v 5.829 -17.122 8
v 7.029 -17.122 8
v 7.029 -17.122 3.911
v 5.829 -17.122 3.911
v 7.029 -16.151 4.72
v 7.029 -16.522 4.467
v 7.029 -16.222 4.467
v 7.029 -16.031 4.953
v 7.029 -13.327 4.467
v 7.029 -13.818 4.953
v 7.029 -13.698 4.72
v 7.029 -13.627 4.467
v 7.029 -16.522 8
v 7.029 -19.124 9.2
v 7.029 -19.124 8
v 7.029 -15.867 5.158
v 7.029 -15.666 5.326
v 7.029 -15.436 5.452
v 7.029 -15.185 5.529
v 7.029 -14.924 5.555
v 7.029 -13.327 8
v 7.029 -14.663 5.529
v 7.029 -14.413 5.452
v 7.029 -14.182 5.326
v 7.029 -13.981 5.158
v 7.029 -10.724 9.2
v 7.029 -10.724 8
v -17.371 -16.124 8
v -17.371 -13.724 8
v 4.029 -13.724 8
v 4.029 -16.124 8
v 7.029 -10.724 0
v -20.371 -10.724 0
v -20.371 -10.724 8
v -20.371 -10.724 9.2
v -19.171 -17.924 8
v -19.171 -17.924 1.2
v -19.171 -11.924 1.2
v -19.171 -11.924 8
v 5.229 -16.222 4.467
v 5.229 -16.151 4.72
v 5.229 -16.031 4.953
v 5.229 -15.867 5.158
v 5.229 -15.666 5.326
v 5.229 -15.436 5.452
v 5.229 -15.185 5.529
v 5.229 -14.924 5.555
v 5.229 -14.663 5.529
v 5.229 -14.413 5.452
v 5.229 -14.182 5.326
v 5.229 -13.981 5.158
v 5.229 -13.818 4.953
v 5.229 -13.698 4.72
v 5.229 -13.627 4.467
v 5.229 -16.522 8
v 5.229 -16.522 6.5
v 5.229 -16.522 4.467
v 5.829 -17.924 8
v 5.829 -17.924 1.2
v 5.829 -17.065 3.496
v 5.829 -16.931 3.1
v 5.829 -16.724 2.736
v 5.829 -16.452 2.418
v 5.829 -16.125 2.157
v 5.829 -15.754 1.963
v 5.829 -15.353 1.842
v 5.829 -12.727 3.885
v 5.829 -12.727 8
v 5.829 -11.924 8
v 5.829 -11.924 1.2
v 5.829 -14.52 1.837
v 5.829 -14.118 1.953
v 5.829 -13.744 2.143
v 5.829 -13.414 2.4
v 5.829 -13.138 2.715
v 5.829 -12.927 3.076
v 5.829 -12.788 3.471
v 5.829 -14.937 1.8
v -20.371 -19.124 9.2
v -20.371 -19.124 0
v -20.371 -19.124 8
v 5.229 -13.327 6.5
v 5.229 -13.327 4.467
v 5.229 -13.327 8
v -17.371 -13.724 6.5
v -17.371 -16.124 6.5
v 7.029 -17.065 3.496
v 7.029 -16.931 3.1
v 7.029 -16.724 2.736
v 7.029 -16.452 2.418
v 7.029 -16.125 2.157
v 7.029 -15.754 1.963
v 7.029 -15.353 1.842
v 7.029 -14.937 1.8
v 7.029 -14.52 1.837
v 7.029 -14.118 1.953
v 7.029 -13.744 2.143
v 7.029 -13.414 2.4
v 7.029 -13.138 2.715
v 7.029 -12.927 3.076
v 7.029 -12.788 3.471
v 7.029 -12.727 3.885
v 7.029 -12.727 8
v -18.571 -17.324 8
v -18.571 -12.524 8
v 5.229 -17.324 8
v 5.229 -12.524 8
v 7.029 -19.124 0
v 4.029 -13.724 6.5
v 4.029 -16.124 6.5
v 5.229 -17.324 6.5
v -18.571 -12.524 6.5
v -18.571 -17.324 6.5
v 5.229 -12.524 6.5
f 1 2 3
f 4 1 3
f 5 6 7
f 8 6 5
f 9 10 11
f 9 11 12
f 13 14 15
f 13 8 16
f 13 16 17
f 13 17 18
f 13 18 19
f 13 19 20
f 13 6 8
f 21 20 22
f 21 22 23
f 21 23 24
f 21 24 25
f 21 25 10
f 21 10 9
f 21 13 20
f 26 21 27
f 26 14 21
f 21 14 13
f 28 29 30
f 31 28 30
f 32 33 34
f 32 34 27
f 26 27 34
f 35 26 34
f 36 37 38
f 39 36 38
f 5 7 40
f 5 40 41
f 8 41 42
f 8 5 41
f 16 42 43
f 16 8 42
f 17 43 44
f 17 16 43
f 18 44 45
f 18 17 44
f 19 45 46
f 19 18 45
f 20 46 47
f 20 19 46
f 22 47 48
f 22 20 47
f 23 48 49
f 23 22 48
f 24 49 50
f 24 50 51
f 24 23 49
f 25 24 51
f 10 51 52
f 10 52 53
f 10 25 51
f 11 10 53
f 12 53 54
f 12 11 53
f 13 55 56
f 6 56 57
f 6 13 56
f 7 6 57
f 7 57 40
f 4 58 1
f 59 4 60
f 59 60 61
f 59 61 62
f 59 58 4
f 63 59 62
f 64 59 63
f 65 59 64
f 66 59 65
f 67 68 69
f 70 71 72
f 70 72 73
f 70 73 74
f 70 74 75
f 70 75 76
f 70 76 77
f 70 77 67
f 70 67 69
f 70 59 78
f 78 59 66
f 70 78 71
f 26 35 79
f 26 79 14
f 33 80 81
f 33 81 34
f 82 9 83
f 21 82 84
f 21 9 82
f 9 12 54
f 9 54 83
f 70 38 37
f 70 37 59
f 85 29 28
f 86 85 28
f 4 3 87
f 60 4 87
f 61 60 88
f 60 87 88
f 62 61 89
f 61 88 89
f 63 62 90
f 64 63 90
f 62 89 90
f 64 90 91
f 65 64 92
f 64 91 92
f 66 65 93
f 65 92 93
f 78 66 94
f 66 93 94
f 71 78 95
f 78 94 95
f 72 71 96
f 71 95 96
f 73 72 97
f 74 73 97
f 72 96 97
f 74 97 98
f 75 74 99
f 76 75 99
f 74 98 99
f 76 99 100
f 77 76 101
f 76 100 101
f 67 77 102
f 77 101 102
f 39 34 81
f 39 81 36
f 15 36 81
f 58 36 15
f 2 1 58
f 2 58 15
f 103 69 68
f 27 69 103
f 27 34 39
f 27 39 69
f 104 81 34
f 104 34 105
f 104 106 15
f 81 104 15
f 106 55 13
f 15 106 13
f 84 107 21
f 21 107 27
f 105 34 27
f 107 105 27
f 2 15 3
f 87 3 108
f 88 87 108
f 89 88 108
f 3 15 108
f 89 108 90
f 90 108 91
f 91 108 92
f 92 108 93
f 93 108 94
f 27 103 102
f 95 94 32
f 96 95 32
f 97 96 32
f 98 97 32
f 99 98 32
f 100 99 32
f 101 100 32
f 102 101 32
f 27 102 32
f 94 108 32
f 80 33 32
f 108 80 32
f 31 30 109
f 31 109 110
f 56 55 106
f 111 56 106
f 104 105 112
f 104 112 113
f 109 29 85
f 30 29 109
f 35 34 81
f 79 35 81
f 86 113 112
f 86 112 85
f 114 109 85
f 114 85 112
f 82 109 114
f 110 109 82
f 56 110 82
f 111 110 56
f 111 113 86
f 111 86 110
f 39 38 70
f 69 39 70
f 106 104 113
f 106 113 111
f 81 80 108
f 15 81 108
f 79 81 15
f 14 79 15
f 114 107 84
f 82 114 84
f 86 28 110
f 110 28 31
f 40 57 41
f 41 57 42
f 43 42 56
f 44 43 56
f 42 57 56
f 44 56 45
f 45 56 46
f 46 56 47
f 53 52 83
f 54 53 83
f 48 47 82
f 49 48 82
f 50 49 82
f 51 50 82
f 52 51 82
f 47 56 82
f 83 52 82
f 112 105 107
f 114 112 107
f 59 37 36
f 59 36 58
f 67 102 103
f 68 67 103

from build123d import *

# Parameters (mm, degrees)
F1_W      = 25
F1_H      = 6
F2_DEPTH  = 1.2
F1_W_2    = 27.4
F1_H_2    = 8.4
F3_DEPTH  = 8
F5_DEPTH  = 1.2
F7_DEPTH  = 1.2
F8_W      = 23.8
F8_H      = 4.8
F8_W_2    = 21.4
F8_H_2    = 2.4
F9_DEPTH  = 1.5
F11_DEPTH = 1.8


with BuildPart() as f2:
    # F1 (on Top) → F2 (new body)
    with BuildSketch(Plane.XY):
        with Locations((-6.6712582588, -14.9236761609)):
            Rectangle(F1_W, F1_H)
    extrude(amount=F2_DEPTH)

    # F1 (on Top) → F3 (join)
    with BuildSketch(Plane.XY):
        with Locations((-6.6712582588, -14.9236761609)):
            Rectangle(F1_W_2, F1_H_2)
        with Locations((-6.6712582588, -14.9236761609)):
            Rectangle(F1_W, F1_H, mode=Mode.SUBTRACT)
    extrude(amount=F3_DEPTH)

    # F4 (on face) → F5 (cut, through all)
    with BuildSketch(Plane.YZ.offset(7.0287417412)):
        with BuildLine():
            Line((-17.1218709581, 8), (-17.1218709581, 4.0891046225))
            Line((-17.1218709581, 4.0891046225), (-17.1218709581, 3.9108953775))
            ThreePointArc((-17.1218709581, 3.9108953775), (-14.9367487796, 1.8000388397), (-12.7266955123, 3.8847783471))
            Line((-12.7266955123, 3.8847783471), (-12.7266955123, 4.1152216529))
            Line((-12.7266955123, 4.1152216529), (-12.7266955123, 8))
            Line((-12.7266955123, 8), (-17.1218709581, 8))
        make_face()
    extrude(amount=-F5_DEPTH, mode=Mode.SUBTRACT)


with BuildPart() as f7:
    # F6 (on face) → F7 (new body)
    with BuildSketch(Plane.XY.offset(8)):
        Polygon((7.0287417412, -10.7236761609), (-20.3712582588, -10.7236761609), (-20.3712582588, -19.1236761609), (7.0287417412, -19.1236761609), (7.0287417412, -17.1218709581), (5.8287417412, -17.1218709581), (5.8287417412, -17.9236761609), (-19.1712582588, -17.9236761609), (-19.1712582588, -11.9236761609), (5.8287417412, -11.9236761609), (5.8287417412, -12.7266955123), (7.0287417412, -12.7266955123), align=None)
        Polygon((7.0287417412, -17.1218709581), (7.0287417412, -12.7266955123), (5.8287417412, -12.7266955123), (5.8287417412, -11.9236761609), (-19.1712582588, -11.9236761609), (-19.1712582588, -17.9236761609), (5.8287417412, -17.9236761609), (5.8287417412, -17.1218709581), align=None)
    extrude(amount=F7_DEPTH)

    # F8 (on face) → F9 (join)
    with BuildSketch(Plane(origin=(0, 0, 8), x_dir=(1, 0, 0), z_dir=(0, 0, -1))):
        with Locations((-6.6712582588, 14.9236761609)):
            Rectangle(F8_W, F8_H)
        with Locations((-6.6712582588, 14.9236761609)):
            Rectangle(F8_W_2, F8_H_2, mode=Mode.SUBTRACT)
    extrude(amount=F9_DEPTH)

    # F10 (on face) → F11 (join, through all)
    with BuildSketch(Plane.YZ.offset(7.0287417412)):
        with BuildLine():
            Line((-13.6266955123, 4.4673751108), (-13.3266955123, 4.4673751108))
            Line((-13.3266955123, 4.4673751108), (-13.3266955123, 8))
            Line((-13.3266955123, 8), (-16.5218709581, 8))
            Line((-16.5218709581, 8), (-16.5218709581, 4.4673751108))
            Line((-16.5218709581, 4.4673751108), (-16.2218709581, 4.4673751108))
            ThreePointArc((-16.2218709581, 4.4673751108), (-14.9242832352, 5.5551861717), (-13.6266955123, 4.4673751108))
        make_face()
    extrude(amount=-F11_DEPTH)


solid = Compound([f2.part, f7.part])
